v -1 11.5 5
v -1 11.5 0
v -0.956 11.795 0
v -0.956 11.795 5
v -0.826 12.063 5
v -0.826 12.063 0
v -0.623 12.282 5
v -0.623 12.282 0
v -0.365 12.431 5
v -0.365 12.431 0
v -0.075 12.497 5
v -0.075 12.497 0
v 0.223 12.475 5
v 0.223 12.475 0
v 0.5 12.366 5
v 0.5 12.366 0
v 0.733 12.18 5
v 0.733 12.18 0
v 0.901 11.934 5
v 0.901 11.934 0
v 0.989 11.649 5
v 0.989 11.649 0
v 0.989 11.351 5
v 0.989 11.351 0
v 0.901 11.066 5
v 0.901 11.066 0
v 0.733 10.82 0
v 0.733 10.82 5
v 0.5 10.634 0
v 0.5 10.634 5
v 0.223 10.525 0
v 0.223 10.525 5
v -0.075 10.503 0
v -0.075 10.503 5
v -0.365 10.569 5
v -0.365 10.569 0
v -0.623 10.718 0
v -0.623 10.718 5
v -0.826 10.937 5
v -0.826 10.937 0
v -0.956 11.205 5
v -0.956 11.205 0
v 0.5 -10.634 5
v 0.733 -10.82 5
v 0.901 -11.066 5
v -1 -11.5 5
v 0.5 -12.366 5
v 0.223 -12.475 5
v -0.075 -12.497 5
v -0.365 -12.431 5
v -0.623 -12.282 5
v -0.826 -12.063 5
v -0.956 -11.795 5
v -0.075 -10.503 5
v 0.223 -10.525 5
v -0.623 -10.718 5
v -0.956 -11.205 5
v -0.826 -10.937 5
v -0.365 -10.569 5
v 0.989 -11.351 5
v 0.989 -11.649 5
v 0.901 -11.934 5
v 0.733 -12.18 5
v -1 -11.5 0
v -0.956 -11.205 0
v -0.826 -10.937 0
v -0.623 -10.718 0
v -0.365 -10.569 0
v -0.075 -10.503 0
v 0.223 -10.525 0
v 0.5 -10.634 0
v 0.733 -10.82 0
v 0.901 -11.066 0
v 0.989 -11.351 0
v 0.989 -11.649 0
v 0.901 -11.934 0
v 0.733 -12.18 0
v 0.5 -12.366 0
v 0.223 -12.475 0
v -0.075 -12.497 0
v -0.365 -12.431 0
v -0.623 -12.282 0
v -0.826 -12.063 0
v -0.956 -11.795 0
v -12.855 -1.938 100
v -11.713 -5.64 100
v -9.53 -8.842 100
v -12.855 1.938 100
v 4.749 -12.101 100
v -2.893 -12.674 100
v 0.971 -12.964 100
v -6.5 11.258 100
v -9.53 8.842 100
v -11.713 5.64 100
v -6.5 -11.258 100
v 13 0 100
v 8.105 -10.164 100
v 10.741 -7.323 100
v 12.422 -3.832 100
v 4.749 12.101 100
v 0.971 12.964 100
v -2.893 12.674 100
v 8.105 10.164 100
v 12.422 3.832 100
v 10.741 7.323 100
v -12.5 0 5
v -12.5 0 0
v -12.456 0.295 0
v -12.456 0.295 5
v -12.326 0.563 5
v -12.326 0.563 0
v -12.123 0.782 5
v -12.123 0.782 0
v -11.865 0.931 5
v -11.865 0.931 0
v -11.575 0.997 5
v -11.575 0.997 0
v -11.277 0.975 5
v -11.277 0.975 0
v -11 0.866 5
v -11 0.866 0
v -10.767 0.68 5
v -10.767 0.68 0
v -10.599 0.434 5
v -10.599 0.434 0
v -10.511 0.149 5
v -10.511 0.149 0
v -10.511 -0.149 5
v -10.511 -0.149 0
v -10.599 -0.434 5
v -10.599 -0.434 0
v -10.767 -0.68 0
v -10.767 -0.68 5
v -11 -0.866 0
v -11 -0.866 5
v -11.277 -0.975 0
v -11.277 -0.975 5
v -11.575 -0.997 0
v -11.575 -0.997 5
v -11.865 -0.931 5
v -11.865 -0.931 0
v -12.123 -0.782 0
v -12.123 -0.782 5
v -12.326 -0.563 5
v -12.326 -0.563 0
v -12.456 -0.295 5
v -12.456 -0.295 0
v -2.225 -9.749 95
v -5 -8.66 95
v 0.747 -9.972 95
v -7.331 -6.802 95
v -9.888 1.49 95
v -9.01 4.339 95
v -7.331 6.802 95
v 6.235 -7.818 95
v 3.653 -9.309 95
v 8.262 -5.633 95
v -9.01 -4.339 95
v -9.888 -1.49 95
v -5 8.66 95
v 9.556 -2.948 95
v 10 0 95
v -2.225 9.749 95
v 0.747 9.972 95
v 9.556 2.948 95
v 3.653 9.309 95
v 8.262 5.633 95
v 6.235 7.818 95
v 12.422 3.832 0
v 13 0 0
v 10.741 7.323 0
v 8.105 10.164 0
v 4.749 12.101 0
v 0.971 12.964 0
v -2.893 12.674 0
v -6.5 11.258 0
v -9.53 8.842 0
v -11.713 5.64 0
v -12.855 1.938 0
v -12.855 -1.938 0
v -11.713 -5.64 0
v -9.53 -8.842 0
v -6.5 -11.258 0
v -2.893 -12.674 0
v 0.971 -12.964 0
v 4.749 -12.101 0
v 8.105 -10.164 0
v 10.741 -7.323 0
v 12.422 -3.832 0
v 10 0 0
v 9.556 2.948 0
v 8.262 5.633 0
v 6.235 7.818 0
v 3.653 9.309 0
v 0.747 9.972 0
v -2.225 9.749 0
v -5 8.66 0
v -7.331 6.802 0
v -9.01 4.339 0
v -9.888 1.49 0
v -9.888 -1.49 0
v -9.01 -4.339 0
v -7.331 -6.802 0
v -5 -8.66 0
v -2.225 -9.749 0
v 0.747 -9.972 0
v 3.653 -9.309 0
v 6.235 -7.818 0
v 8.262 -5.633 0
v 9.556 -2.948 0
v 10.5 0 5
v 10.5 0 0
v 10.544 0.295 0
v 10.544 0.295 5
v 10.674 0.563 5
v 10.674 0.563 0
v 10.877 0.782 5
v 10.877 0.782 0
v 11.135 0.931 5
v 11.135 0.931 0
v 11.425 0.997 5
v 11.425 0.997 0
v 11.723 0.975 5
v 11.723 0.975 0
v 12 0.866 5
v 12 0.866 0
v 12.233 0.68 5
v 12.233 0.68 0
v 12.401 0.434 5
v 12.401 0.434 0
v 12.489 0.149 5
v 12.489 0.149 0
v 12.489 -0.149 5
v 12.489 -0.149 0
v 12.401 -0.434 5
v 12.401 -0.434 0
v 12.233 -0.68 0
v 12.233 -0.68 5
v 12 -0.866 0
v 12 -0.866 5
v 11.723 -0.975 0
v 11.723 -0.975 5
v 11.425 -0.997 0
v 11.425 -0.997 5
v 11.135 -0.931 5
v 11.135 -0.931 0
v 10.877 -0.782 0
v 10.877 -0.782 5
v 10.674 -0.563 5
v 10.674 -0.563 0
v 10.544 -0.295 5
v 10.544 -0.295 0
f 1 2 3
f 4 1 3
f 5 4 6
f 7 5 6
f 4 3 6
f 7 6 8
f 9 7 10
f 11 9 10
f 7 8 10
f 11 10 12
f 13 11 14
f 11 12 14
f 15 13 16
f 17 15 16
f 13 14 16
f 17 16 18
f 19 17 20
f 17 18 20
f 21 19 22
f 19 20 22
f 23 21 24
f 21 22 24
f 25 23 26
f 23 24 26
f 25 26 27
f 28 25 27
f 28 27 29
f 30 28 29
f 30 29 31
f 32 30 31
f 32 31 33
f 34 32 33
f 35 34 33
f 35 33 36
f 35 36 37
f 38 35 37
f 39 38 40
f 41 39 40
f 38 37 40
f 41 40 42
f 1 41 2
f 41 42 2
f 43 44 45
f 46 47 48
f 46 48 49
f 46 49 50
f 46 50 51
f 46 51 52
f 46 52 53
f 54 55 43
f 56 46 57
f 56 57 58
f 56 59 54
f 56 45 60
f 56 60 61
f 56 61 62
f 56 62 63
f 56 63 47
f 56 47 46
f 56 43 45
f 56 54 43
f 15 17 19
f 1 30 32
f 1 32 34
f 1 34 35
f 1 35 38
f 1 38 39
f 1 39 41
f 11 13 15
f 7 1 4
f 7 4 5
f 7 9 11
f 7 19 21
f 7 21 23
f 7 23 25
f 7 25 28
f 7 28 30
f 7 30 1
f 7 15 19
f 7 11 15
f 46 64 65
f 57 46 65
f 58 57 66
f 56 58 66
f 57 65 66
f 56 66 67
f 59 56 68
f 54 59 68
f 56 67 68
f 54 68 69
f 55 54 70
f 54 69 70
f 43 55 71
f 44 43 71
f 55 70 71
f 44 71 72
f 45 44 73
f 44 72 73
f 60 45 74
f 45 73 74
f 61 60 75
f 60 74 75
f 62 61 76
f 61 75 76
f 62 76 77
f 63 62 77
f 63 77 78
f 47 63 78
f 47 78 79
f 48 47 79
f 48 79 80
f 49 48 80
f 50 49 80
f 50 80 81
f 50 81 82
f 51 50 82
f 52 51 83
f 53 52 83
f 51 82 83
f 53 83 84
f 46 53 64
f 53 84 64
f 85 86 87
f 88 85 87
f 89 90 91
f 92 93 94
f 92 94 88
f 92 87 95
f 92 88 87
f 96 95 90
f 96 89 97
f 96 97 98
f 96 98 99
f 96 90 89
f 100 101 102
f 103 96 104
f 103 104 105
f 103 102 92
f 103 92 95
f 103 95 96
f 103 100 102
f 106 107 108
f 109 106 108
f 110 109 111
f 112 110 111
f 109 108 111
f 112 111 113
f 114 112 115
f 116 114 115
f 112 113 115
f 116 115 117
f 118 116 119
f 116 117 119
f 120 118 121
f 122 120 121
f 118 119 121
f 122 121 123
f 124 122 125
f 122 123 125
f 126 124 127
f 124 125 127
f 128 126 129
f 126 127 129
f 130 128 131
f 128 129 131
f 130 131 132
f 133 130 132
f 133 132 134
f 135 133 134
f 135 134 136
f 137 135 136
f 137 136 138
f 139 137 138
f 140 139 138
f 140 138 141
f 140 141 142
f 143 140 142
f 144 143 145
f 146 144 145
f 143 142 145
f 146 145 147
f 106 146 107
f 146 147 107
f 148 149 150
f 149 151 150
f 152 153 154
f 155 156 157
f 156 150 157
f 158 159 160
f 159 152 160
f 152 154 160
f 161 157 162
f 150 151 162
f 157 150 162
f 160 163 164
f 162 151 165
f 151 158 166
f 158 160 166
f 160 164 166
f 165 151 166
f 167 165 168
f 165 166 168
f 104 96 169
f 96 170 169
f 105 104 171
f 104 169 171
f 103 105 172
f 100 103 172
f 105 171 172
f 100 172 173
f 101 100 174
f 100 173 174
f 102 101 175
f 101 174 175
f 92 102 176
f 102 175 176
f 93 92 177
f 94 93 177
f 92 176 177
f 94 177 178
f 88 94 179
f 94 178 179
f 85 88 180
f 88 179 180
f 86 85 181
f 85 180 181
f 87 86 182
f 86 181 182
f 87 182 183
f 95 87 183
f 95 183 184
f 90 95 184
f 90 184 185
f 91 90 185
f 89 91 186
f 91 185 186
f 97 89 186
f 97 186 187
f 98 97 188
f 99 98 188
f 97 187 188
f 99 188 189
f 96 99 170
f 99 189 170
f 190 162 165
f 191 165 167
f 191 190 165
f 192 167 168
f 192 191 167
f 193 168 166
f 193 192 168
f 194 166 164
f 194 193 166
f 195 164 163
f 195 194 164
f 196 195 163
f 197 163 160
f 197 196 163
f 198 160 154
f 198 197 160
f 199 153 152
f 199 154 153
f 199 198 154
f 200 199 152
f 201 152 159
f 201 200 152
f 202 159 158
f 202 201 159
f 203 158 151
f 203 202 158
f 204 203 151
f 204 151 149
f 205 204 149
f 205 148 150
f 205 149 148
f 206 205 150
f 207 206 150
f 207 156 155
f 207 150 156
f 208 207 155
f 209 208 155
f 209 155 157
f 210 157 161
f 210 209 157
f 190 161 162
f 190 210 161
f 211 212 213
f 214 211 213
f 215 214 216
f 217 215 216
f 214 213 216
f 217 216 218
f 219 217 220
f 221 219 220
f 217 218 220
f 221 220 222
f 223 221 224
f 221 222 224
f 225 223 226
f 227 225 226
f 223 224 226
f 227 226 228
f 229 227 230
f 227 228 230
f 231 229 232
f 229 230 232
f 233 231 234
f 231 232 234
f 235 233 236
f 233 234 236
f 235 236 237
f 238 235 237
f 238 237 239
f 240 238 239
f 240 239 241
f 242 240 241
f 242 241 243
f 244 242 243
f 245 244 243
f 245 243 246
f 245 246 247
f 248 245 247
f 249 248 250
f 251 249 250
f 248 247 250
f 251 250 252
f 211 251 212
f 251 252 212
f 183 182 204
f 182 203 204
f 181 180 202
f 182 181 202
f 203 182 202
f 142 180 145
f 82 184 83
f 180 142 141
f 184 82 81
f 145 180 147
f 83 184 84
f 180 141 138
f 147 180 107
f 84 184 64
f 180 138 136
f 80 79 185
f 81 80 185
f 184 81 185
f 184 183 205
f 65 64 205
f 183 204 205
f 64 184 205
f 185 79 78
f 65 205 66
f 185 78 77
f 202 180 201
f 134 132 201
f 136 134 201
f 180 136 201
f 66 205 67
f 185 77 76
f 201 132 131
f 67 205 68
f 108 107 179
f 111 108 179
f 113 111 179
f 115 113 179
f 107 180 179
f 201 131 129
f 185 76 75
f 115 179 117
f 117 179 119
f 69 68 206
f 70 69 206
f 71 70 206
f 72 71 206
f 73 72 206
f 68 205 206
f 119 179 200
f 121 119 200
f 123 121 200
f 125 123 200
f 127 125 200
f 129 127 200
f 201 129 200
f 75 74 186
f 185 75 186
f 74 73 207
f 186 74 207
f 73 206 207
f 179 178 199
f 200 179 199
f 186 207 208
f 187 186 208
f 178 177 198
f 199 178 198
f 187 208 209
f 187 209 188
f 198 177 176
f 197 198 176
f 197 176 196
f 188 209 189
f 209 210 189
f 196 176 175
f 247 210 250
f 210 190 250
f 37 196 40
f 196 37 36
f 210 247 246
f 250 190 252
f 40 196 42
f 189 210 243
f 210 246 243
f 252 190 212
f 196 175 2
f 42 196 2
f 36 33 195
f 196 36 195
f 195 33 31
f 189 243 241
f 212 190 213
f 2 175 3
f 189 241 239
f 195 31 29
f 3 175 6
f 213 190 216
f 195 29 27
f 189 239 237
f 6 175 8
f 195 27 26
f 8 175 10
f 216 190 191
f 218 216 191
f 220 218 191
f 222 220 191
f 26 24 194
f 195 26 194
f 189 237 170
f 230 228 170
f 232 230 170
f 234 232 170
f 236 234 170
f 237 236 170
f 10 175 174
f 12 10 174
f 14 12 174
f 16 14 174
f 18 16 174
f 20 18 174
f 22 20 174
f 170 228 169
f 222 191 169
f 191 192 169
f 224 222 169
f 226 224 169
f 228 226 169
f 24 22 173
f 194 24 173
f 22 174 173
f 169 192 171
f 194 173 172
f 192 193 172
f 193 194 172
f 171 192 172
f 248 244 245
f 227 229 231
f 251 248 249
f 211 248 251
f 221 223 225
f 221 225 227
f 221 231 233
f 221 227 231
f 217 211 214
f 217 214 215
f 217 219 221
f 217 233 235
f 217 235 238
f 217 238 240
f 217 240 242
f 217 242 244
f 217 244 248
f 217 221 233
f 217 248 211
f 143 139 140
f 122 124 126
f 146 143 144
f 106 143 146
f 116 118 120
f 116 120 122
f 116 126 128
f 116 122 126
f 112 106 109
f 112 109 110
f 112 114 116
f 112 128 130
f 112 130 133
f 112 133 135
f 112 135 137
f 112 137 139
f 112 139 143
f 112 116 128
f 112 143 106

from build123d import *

# Parameters (mm, degrees)
SKETCH_1_R          = 13
SKETCH_1_R_2        = 10
EXTRUDE_1_DEPTH     = 100
EXTRUDE_START       = -5
SKETCH_2_R          = 13
EXTRUDE_2_DEPTH     = 5
SKETCH_3_R          = 1
CUT_EXTRUDE_1_DEPTH = 5


with BuildPart() as part:
    # 草图1 → 凸台-拉伸1 (new body)
    with BuildSketch(Plane.XY):
        Circle(SKETCH_1_R)
        Circle(SKETCH_1_R_2, mode=Mode.SUBTRACT)
    extrude(amount=EXTRUDE_1_DEPTH)

    # 草图2 → 凸台-拉伸2 (add)
    with BuildSketch(Plane.XY.offset(100).offset(EXTRUDE_START)):
        Circle(SKETCH_2_R)
    extrude(amount=EXTRUDE_2_DEPTH)

    # 草图3 → 切除-拉伸1 (cut)
    with BuildSketch(Plane(origin=(0, 0, 0), x_dir=(-1, 0, 0), z_dir=(0, 0, -1))):
        with Locations((0, 11.5)):
            Circle(SKETCH_3_R)
        with Locations((11.5, 0)):
            Circle(SKETCH_3_R)
        with Locations((0, -11.5)):
            Circle(SKETCH_3_R)
        with Locations((-11.5, 0)):
            Circle(SKETCH_3_R)
    extrude(amount=-CUT_EXTRUDE_1_DEPTH, mode=Mode.SUBTRACT)


solid = part.part
